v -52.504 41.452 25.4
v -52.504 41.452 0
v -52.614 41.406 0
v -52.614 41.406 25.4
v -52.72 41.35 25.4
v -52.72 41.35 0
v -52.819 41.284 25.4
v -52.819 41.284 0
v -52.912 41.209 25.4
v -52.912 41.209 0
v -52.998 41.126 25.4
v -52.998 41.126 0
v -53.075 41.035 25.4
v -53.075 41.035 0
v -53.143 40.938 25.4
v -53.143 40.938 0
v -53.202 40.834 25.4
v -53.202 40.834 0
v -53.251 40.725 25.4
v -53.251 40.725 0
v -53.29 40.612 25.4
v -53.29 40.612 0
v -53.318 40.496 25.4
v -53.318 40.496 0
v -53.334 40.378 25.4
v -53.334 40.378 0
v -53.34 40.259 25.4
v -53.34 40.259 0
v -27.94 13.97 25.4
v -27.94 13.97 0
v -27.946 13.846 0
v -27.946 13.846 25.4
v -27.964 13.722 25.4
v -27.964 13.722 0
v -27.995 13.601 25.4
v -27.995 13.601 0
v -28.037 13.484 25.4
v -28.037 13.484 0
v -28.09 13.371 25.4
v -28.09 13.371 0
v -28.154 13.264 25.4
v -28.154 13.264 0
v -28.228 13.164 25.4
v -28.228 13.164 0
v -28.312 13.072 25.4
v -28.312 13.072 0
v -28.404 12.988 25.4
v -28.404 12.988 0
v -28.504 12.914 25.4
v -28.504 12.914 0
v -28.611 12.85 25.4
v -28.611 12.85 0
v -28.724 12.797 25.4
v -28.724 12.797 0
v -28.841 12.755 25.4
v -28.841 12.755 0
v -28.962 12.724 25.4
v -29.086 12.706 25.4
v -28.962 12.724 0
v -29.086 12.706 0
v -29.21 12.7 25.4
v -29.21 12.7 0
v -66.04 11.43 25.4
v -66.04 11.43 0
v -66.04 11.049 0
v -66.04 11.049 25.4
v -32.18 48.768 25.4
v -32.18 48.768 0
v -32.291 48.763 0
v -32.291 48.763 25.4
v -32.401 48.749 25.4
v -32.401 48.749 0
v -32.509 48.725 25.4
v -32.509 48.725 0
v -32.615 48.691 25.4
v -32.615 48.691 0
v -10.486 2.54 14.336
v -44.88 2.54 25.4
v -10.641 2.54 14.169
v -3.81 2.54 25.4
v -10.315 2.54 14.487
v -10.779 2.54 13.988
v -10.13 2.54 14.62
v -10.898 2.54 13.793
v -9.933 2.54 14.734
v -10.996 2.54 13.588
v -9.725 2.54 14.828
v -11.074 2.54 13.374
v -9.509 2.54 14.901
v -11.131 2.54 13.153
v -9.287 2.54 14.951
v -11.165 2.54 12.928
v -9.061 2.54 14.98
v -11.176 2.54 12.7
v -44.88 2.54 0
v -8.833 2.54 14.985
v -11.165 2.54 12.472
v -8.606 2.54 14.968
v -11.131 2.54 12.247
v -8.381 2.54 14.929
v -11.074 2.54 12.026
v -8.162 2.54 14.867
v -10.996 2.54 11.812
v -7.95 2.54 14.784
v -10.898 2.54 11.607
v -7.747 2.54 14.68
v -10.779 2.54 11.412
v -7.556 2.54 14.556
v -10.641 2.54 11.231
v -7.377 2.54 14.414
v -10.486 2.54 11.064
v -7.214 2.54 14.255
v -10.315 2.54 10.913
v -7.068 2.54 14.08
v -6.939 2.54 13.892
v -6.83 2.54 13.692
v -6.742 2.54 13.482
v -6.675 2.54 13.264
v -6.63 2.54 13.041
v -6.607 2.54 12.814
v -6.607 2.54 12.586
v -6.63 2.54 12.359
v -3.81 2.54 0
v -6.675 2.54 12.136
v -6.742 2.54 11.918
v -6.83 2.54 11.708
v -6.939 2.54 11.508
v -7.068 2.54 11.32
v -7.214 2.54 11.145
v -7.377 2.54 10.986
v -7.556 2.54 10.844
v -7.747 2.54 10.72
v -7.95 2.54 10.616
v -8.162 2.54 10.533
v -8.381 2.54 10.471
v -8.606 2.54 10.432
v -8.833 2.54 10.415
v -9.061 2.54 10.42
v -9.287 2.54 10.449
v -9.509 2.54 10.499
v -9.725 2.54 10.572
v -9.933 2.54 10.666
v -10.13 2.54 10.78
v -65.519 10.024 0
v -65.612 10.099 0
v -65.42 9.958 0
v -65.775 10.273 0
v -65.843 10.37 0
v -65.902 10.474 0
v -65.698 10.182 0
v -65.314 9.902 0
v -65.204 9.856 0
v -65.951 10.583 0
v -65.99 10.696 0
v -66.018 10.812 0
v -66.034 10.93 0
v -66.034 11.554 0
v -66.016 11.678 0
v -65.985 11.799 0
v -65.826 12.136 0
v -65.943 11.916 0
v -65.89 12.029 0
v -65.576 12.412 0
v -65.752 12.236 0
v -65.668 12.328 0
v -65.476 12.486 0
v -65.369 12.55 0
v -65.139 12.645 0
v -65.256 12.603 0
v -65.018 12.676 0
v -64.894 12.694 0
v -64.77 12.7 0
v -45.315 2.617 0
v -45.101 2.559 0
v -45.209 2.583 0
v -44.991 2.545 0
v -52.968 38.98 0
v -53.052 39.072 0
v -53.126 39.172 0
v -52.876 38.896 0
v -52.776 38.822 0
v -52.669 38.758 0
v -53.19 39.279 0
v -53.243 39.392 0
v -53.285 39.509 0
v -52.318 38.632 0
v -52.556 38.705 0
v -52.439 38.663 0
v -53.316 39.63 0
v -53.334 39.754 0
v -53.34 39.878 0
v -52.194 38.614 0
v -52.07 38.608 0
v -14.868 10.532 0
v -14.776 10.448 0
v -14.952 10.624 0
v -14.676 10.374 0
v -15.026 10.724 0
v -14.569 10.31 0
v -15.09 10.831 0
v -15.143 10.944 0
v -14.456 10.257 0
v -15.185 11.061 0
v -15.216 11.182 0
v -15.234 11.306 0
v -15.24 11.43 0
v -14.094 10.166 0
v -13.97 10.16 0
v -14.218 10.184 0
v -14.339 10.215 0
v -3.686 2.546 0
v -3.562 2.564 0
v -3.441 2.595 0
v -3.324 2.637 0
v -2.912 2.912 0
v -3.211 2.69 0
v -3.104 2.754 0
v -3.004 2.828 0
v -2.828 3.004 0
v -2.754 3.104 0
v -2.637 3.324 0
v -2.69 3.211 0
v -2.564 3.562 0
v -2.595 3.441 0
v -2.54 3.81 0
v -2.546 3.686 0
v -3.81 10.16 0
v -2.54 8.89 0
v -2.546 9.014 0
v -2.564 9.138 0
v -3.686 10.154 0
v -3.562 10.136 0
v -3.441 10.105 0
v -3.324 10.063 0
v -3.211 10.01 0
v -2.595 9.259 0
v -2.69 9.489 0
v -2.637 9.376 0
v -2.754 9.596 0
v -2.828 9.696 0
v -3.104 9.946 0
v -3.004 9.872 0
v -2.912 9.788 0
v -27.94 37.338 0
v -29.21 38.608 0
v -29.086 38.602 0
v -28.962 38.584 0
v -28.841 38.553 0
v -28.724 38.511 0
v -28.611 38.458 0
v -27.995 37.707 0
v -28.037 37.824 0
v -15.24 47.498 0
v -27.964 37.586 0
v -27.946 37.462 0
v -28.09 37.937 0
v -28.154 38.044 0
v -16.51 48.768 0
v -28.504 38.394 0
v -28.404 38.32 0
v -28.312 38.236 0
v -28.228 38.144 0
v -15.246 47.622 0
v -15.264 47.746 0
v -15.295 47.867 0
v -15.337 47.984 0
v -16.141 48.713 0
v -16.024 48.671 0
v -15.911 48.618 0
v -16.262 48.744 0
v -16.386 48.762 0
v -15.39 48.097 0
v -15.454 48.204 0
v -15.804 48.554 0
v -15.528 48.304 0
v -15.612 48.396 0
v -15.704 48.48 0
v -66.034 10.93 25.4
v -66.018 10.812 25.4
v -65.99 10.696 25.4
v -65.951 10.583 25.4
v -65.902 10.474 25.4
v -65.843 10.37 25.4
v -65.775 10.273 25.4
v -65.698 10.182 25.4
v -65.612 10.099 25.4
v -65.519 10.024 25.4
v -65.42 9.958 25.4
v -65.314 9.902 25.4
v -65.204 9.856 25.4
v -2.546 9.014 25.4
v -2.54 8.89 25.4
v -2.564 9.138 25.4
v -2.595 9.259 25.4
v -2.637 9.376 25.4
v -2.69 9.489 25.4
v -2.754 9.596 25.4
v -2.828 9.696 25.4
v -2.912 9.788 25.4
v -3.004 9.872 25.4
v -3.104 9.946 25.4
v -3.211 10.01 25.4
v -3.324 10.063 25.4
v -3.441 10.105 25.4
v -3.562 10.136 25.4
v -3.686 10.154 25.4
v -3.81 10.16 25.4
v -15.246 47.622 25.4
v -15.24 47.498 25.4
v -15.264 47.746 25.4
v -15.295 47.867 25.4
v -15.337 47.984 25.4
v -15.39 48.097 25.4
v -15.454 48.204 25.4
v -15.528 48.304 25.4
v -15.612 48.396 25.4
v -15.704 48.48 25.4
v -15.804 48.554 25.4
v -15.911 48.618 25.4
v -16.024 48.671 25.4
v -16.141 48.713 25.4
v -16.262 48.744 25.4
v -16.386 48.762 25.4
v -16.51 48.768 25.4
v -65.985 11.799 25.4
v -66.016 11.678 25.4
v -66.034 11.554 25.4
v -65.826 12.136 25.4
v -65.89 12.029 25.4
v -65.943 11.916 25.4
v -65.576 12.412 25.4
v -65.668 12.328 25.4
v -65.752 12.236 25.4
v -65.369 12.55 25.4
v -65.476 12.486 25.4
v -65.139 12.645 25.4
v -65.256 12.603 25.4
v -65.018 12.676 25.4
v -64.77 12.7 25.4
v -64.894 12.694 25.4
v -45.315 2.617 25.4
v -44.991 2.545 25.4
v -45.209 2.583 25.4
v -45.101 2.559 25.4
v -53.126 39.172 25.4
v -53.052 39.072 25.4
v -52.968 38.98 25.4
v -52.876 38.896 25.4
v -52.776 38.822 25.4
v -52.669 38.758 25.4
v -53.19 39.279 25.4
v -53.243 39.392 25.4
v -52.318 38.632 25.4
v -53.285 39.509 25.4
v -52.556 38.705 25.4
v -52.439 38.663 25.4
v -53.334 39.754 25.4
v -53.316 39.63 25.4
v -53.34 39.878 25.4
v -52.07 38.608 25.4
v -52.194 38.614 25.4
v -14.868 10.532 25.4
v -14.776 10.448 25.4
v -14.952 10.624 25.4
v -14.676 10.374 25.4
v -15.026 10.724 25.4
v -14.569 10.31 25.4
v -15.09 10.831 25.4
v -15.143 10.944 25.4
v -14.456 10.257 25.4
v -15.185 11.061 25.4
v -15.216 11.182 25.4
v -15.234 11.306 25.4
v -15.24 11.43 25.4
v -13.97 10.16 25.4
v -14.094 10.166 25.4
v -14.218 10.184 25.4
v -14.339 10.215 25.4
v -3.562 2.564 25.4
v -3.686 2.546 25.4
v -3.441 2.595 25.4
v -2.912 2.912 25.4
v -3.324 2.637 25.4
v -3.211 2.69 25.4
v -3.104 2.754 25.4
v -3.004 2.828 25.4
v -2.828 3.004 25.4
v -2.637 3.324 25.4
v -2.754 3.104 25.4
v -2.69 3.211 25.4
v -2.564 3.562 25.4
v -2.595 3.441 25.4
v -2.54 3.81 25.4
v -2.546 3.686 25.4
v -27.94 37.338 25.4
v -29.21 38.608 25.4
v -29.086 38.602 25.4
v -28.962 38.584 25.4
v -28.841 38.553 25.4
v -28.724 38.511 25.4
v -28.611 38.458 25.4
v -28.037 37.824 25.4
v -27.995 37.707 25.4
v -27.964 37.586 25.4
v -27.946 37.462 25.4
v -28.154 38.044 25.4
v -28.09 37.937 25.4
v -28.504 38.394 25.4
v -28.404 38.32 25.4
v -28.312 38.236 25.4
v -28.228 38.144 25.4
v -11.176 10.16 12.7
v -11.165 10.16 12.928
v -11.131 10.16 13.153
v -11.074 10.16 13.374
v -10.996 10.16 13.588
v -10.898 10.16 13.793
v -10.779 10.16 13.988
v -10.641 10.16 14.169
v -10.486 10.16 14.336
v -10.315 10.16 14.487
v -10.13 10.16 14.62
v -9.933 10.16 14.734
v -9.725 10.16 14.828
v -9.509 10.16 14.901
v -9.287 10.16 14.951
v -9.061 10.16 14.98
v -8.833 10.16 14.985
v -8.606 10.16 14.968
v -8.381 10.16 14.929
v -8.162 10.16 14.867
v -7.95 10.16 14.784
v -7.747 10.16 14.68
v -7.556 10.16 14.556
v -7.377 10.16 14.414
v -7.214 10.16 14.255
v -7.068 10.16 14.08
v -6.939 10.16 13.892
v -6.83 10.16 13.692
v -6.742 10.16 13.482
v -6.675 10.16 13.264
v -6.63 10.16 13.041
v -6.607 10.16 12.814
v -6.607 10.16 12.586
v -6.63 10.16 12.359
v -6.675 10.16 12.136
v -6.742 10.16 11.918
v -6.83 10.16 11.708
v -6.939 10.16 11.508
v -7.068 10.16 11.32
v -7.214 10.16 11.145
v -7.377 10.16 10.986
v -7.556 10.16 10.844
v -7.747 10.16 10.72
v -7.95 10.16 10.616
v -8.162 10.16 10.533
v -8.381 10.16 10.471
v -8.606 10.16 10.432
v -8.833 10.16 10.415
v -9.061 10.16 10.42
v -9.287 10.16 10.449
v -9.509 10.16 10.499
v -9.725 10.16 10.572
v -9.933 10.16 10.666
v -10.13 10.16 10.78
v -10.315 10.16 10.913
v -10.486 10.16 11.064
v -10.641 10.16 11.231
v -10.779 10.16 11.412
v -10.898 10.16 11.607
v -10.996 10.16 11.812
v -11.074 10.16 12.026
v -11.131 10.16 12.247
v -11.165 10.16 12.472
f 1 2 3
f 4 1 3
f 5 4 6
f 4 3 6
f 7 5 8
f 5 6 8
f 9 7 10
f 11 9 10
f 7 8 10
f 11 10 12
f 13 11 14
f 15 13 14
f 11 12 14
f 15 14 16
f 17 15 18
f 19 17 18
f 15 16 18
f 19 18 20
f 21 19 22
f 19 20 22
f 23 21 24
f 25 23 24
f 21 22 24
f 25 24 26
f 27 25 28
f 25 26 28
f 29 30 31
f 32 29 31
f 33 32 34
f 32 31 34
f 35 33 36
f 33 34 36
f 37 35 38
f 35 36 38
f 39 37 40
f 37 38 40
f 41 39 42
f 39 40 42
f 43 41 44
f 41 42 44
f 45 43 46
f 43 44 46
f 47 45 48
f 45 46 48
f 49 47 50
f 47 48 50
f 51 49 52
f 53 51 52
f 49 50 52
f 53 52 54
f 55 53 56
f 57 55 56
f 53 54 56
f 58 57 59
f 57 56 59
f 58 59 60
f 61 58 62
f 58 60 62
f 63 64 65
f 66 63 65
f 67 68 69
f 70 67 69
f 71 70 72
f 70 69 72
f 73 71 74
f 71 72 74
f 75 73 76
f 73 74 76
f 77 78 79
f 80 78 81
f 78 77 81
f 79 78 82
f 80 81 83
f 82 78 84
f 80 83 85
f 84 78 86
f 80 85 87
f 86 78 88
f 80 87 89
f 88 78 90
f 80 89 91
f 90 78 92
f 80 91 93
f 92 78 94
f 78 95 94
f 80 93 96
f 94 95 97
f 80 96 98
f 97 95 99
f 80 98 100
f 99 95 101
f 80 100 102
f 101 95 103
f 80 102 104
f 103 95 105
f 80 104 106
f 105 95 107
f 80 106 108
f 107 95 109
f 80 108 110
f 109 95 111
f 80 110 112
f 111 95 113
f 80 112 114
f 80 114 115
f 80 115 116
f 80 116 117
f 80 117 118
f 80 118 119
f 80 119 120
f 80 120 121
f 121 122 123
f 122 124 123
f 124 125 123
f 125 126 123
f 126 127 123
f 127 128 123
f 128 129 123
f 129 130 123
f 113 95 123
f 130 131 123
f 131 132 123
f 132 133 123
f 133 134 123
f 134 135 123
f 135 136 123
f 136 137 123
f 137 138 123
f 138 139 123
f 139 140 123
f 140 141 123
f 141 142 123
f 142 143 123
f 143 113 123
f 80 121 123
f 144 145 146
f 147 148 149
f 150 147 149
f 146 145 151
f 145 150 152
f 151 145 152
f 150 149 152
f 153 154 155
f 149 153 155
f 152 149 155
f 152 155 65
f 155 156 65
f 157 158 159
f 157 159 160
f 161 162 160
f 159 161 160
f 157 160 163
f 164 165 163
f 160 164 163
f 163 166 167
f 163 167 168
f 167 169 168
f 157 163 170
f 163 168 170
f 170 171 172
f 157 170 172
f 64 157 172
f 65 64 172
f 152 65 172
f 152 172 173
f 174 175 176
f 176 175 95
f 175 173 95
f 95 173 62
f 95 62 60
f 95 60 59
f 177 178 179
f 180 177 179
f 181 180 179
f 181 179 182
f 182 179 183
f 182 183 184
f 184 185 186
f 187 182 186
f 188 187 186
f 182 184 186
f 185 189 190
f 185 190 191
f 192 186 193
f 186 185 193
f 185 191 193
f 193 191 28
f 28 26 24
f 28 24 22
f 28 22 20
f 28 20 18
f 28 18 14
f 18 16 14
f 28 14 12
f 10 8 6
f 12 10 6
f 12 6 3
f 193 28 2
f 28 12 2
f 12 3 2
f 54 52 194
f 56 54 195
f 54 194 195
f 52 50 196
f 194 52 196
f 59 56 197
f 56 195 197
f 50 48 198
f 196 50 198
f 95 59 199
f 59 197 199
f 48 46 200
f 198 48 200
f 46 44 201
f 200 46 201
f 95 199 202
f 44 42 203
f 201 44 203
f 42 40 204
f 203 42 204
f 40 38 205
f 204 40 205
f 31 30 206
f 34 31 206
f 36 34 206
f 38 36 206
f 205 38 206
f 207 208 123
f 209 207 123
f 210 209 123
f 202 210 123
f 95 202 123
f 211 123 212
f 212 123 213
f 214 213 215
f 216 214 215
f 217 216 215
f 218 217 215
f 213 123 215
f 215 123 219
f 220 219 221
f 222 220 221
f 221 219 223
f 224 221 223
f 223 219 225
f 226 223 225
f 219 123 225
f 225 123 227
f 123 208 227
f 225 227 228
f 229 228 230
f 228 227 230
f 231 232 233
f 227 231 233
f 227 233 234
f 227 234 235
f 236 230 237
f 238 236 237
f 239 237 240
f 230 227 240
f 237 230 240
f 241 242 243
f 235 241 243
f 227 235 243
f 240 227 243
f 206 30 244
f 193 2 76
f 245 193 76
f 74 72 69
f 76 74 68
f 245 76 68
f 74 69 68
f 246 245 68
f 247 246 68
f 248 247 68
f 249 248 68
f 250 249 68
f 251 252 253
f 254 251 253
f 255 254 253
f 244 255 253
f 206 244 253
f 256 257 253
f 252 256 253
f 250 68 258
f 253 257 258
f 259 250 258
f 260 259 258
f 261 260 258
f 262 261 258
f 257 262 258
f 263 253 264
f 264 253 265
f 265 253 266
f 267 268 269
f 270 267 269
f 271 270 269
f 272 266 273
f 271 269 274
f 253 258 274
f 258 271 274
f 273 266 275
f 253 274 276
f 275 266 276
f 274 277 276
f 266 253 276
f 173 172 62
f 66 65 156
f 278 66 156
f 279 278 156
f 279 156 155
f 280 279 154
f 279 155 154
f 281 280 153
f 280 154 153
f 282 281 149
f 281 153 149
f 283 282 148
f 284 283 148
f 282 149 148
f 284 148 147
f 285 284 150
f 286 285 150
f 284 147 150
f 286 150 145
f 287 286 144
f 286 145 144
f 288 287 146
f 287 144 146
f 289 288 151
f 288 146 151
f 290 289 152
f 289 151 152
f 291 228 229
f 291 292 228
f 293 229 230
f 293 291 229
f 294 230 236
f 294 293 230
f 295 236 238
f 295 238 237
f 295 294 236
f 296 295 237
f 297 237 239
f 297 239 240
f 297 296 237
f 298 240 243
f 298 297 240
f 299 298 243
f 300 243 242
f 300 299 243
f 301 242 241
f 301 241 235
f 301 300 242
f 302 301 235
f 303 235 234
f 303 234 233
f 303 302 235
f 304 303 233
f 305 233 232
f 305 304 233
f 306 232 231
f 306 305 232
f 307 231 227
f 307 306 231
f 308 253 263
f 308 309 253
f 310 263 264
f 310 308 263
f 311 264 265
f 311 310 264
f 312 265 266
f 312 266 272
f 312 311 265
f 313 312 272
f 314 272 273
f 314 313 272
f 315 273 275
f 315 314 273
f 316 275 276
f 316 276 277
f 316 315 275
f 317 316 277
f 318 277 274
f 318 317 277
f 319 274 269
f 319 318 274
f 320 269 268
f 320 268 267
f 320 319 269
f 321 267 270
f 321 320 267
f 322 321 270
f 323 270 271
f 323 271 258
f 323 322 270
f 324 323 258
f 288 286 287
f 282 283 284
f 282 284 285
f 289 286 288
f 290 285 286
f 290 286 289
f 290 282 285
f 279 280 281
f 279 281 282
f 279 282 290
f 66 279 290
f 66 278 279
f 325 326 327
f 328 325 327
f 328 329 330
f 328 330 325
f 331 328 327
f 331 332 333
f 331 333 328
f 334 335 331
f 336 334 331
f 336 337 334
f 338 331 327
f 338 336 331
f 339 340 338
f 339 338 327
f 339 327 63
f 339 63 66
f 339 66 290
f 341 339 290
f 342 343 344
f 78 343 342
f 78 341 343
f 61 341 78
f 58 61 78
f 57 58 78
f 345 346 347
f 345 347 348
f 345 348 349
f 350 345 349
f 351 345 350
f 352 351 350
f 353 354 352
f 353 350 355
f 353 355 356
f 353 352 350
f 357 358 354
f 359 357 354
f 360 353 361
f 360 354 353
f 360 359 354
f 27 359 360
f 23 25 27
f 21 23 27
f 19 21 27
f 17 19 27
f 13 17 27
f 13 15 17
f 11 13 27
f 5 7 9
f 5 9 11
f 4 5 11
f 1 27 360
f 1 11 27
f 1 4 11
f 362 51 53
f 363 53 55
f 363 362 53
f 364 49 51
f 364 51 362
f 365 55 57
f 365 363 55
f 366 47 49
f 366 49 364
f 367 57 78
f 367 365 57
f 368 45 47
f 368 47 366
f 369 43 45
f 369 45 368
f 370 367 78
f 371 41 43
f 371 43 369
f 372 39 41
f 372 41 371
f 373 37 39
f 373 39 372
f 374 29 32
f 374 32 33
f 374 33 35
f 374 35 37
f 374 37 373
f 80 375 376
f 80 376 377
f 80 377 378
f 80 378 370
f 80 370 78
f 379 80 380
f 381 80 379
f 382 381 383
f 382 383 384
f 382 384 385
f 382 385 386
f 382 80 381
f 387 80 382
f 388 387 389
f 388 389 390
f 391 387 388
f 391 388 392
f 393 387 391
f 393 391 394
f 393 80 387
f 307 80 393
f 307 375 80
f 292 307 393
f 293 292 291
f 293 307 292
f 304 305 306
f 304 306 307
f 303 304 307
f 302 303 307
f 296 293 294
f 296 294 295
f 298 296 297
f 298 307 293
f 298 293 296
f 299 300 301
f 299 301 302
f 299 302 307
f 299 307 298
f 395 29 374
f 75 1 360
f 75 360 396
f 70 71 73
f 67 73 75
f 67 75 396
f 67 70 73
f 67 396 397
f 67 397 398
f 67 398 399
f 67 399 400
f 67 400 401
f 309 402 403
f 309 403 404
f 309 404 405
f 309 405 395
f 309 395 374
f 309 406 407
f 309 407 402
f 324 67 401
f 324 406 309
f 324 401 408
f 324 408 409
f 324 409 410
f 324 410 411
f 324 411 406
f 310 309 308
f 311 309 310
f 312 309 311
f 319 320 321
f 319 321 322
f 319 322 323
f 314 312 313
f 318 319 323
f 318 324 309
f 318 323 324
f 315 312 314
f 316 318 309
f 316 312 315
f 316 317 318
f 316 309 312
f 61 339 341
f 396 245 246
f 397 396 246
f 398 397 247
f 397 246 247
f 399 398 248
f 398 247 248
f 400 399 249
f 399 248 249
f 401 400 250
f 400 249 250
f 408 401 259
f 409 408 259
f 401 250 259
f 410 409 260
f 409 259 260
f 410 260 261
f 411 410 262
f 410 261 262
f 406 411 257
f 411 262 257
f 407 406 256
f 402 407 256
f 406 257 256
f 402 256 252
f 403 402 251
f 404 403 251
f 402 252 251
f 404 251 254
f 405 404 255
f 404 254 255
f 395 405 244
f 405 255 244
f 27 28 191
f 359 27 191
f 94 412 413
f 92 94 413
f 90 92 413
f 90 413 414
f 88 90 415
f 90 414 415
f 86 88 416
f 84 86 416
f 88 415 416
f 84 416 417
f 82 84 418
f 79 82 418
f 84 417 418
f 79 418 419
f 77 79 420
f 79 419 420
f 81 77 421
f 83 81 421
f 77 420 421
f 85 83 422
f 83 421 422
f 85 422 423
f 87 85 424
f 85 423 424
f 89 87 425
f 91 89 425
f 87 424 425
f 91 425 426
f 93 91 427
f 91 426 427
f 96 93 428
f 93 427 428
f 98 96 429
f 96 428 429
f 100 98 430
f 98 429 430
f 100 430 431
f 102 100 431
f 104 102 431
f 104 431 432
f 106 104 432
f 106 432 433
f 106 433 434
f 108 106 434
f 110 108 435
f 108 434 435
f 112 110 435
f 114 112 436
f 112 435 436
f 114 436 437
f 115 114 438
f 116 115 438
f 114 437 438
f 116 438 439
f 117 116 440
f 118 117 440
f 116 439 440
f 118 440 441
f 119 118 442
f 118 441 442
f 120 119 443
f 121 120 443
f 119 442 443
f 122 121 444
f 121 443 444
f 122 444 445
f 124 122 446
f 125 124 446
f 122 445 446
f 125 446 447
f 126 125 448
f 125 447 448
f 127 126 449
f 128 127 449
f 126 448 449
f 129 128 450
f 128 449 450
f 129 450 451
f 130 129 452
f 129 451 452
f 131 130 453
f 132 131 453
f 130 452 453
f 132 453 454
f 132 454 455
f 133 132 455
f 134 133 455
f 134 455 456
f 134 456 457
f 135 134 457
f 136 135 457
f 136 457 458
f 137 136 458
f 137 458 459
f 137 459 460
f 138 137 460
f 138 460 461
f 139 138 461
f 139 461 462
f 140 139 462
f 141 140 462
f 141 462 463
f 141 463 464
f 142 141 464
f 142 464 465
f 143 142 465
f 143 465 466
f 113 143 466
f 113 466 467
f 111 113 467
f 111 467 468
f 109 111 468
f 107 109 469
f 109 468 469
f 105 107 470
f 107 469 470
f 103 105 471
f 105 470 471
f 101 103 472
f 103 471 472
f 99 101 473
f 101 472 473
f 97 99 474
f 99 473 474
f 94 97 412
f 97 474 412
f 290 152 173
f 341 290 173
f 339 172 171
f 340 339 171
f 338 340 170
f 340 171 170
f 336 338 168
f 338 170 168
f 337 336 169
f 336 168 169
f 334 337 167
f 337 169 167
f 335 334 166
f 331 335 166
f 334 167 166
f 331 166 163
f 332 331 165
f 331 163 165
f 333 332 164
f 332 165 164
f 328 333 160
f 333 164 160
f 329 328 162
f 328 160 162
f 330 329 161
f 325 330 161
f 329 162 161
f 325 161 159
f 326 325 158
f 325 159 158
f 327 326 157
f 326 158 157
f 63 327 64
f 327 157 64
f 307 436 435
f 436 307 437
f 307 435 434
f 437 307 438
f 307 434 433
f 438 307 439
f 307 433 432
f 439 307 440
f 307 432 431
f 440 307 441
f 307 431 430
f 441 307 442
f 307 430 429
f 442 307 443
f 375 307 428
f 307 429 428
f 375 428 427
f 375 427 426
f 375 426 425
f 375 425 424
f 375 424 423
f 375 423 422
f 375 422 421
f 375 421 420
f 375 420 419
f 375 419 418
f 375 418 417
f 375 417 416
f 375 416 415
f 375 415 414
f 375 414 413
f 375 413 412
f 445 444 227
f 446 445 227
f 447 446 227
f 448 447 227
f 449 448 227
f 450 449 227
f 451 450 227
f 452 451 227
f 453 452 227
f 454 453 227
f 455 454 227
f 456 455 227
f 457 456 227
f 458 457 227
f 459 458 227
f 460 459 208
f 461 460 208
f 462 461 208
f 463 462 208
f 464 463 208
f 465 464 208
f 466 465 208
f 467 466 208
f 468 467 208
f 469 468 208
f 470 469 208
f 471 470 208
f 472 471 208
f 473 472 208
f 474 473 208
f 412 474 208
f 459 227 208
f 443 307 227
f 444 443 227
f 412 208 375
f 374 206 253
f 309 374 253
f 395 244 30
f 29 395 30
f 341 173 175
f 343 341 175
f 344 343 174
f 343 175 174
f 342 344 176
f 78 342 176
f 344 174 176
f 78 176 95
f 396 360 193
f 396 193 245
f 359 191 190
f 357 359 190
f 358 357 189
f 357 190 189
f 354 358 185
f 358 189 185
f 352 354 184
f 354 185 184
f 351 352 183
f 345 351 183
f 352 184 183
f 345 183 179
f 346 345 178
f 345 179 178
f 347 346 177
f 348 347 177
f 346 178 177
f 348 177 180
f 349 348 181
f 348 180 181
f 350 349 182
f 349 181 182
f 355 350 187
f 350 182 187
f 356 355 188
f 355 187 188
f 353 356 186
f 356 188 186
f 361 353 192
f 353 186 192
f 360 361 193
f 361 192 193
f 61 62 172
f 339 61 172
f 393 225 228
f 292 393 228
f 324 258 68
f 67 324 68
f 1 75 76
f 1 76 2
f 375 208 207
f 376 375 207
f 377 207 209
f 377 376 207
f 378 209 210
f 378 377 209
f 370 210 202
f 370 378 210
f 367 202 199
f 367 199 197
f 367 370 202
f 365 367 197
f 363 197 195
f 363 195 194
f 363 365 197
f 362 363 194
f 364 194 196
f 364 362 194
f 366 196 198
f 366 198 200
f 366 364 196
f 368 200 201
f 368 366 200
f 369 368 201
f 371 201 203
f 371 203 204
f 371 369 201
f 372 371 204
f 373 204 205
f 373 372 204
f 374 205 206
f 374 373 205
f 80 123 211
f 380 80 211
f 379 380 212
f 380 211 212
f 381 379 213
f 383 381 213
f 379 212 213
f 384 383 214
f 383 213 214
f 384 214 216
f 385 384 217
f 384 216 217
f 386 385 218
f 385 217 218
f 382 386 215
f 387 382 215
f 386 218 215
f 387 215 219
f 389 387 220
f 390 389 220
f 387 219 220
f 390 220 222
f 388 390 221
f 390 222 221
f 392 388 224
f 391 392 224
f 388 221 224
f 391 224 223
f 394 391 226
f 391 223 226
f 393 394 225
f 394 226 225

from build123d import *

# Parameters (mm, degrees)
F1_DEPTH = 25.4
F2_R     = 1.27
F3_R     = 2.286
F4_DEPTH = 7.62


with BuildPart() as f1:
    # F0 (on Top) → F1 (new body)
    with BuildSketch(Plane.XY):
        with BuildLine():
            Line((-44.880287, 2.54), (-3.81, 2.54))
            ThreePointArc((-3.81, 2.54), (-2.911974, 2.911974), (-2.54, 3.81))
            Line((-2.54, 3.81), (-2.54, 10.16))
            Line((-2.54, 10.16), (-15.24, 10.16))
            Line((-15.24, 10.16), (-15.24, 48.768))
            Line((-15.24, 48.768), (-32.180287, 48.768))
            ThreePointArc((-32.180287, 48.768), (-32.40082, 48.748706), (-32.614652, 48.69141))
            Line((-32.614652, 48.69141), (-52.504366, 41.452146))
            ThreePointArc((-52.504366, 41.452146), (-53.110323, 40.987179), (-53.34, 40.258736))
            Line((-53.34, 40.258736), (-53.34, 39.878))
            ThreePointArc((-53.34, 39.878), (-52.968026, 38.979974), (-52.07, 38.608))
            Line((-52.07, 38.608), (-29.21, 38.608))
            ThreePointArc((-29.21, 38.608), (-28.311974, 38.236026), (-27.94, 37.338))
            Line((-27.94, 37.338), (-27.94, 13.97))
            ThreePointArc((-27.94, 13.97), (-28.311974, 13.071974), (-29.21, 12.7))
            Line((-29.21, 12.7), (-64.77, 12.7))
            ThreePointArc((-64.77, 12.7), (-65.668026, 12.328026), (-66.04, 11.43))
            Line((-66.04, 11.43), (-66.04, 11.049264))
            ThreePointArc((-66.04, 11.049264), (-65.810323, 10.320821), (-65.204366, 9.855854))
            Line((-65.204366, 9.855854), (-45.314652, 2.61659))
            ThreePointArc((-45.314652, 2.61659), (-45.10082, 2.559294), (-44.880287, 2.54))
        make_face()
    extrude(amount=F1_DEPTH)

    # F2
    f2_edges = [f1.edges().sort_by_distance(p)[0] for p in [
        (-15.24, 10.16, 12.7),
        (-2.54, 10.16, 12.7),
        (-15.24, 48.768, 12.7),
    ]]
    fillet(f2_edges, radius=F2_R)

    # F3 (on face) → F4 (cut, through all)
    with BuildSketch(Plane(origin=(0, 10.16, 0), x_dir=(-1, 0, 0), z_dir=(0, 1, 0))):
        with Locations((8.89, 12.7)):
            Circle(F3_R)
    extrude(amount=-F4_DEPTH, mode=Mode.SUBTRACT)


solid = f1.part
